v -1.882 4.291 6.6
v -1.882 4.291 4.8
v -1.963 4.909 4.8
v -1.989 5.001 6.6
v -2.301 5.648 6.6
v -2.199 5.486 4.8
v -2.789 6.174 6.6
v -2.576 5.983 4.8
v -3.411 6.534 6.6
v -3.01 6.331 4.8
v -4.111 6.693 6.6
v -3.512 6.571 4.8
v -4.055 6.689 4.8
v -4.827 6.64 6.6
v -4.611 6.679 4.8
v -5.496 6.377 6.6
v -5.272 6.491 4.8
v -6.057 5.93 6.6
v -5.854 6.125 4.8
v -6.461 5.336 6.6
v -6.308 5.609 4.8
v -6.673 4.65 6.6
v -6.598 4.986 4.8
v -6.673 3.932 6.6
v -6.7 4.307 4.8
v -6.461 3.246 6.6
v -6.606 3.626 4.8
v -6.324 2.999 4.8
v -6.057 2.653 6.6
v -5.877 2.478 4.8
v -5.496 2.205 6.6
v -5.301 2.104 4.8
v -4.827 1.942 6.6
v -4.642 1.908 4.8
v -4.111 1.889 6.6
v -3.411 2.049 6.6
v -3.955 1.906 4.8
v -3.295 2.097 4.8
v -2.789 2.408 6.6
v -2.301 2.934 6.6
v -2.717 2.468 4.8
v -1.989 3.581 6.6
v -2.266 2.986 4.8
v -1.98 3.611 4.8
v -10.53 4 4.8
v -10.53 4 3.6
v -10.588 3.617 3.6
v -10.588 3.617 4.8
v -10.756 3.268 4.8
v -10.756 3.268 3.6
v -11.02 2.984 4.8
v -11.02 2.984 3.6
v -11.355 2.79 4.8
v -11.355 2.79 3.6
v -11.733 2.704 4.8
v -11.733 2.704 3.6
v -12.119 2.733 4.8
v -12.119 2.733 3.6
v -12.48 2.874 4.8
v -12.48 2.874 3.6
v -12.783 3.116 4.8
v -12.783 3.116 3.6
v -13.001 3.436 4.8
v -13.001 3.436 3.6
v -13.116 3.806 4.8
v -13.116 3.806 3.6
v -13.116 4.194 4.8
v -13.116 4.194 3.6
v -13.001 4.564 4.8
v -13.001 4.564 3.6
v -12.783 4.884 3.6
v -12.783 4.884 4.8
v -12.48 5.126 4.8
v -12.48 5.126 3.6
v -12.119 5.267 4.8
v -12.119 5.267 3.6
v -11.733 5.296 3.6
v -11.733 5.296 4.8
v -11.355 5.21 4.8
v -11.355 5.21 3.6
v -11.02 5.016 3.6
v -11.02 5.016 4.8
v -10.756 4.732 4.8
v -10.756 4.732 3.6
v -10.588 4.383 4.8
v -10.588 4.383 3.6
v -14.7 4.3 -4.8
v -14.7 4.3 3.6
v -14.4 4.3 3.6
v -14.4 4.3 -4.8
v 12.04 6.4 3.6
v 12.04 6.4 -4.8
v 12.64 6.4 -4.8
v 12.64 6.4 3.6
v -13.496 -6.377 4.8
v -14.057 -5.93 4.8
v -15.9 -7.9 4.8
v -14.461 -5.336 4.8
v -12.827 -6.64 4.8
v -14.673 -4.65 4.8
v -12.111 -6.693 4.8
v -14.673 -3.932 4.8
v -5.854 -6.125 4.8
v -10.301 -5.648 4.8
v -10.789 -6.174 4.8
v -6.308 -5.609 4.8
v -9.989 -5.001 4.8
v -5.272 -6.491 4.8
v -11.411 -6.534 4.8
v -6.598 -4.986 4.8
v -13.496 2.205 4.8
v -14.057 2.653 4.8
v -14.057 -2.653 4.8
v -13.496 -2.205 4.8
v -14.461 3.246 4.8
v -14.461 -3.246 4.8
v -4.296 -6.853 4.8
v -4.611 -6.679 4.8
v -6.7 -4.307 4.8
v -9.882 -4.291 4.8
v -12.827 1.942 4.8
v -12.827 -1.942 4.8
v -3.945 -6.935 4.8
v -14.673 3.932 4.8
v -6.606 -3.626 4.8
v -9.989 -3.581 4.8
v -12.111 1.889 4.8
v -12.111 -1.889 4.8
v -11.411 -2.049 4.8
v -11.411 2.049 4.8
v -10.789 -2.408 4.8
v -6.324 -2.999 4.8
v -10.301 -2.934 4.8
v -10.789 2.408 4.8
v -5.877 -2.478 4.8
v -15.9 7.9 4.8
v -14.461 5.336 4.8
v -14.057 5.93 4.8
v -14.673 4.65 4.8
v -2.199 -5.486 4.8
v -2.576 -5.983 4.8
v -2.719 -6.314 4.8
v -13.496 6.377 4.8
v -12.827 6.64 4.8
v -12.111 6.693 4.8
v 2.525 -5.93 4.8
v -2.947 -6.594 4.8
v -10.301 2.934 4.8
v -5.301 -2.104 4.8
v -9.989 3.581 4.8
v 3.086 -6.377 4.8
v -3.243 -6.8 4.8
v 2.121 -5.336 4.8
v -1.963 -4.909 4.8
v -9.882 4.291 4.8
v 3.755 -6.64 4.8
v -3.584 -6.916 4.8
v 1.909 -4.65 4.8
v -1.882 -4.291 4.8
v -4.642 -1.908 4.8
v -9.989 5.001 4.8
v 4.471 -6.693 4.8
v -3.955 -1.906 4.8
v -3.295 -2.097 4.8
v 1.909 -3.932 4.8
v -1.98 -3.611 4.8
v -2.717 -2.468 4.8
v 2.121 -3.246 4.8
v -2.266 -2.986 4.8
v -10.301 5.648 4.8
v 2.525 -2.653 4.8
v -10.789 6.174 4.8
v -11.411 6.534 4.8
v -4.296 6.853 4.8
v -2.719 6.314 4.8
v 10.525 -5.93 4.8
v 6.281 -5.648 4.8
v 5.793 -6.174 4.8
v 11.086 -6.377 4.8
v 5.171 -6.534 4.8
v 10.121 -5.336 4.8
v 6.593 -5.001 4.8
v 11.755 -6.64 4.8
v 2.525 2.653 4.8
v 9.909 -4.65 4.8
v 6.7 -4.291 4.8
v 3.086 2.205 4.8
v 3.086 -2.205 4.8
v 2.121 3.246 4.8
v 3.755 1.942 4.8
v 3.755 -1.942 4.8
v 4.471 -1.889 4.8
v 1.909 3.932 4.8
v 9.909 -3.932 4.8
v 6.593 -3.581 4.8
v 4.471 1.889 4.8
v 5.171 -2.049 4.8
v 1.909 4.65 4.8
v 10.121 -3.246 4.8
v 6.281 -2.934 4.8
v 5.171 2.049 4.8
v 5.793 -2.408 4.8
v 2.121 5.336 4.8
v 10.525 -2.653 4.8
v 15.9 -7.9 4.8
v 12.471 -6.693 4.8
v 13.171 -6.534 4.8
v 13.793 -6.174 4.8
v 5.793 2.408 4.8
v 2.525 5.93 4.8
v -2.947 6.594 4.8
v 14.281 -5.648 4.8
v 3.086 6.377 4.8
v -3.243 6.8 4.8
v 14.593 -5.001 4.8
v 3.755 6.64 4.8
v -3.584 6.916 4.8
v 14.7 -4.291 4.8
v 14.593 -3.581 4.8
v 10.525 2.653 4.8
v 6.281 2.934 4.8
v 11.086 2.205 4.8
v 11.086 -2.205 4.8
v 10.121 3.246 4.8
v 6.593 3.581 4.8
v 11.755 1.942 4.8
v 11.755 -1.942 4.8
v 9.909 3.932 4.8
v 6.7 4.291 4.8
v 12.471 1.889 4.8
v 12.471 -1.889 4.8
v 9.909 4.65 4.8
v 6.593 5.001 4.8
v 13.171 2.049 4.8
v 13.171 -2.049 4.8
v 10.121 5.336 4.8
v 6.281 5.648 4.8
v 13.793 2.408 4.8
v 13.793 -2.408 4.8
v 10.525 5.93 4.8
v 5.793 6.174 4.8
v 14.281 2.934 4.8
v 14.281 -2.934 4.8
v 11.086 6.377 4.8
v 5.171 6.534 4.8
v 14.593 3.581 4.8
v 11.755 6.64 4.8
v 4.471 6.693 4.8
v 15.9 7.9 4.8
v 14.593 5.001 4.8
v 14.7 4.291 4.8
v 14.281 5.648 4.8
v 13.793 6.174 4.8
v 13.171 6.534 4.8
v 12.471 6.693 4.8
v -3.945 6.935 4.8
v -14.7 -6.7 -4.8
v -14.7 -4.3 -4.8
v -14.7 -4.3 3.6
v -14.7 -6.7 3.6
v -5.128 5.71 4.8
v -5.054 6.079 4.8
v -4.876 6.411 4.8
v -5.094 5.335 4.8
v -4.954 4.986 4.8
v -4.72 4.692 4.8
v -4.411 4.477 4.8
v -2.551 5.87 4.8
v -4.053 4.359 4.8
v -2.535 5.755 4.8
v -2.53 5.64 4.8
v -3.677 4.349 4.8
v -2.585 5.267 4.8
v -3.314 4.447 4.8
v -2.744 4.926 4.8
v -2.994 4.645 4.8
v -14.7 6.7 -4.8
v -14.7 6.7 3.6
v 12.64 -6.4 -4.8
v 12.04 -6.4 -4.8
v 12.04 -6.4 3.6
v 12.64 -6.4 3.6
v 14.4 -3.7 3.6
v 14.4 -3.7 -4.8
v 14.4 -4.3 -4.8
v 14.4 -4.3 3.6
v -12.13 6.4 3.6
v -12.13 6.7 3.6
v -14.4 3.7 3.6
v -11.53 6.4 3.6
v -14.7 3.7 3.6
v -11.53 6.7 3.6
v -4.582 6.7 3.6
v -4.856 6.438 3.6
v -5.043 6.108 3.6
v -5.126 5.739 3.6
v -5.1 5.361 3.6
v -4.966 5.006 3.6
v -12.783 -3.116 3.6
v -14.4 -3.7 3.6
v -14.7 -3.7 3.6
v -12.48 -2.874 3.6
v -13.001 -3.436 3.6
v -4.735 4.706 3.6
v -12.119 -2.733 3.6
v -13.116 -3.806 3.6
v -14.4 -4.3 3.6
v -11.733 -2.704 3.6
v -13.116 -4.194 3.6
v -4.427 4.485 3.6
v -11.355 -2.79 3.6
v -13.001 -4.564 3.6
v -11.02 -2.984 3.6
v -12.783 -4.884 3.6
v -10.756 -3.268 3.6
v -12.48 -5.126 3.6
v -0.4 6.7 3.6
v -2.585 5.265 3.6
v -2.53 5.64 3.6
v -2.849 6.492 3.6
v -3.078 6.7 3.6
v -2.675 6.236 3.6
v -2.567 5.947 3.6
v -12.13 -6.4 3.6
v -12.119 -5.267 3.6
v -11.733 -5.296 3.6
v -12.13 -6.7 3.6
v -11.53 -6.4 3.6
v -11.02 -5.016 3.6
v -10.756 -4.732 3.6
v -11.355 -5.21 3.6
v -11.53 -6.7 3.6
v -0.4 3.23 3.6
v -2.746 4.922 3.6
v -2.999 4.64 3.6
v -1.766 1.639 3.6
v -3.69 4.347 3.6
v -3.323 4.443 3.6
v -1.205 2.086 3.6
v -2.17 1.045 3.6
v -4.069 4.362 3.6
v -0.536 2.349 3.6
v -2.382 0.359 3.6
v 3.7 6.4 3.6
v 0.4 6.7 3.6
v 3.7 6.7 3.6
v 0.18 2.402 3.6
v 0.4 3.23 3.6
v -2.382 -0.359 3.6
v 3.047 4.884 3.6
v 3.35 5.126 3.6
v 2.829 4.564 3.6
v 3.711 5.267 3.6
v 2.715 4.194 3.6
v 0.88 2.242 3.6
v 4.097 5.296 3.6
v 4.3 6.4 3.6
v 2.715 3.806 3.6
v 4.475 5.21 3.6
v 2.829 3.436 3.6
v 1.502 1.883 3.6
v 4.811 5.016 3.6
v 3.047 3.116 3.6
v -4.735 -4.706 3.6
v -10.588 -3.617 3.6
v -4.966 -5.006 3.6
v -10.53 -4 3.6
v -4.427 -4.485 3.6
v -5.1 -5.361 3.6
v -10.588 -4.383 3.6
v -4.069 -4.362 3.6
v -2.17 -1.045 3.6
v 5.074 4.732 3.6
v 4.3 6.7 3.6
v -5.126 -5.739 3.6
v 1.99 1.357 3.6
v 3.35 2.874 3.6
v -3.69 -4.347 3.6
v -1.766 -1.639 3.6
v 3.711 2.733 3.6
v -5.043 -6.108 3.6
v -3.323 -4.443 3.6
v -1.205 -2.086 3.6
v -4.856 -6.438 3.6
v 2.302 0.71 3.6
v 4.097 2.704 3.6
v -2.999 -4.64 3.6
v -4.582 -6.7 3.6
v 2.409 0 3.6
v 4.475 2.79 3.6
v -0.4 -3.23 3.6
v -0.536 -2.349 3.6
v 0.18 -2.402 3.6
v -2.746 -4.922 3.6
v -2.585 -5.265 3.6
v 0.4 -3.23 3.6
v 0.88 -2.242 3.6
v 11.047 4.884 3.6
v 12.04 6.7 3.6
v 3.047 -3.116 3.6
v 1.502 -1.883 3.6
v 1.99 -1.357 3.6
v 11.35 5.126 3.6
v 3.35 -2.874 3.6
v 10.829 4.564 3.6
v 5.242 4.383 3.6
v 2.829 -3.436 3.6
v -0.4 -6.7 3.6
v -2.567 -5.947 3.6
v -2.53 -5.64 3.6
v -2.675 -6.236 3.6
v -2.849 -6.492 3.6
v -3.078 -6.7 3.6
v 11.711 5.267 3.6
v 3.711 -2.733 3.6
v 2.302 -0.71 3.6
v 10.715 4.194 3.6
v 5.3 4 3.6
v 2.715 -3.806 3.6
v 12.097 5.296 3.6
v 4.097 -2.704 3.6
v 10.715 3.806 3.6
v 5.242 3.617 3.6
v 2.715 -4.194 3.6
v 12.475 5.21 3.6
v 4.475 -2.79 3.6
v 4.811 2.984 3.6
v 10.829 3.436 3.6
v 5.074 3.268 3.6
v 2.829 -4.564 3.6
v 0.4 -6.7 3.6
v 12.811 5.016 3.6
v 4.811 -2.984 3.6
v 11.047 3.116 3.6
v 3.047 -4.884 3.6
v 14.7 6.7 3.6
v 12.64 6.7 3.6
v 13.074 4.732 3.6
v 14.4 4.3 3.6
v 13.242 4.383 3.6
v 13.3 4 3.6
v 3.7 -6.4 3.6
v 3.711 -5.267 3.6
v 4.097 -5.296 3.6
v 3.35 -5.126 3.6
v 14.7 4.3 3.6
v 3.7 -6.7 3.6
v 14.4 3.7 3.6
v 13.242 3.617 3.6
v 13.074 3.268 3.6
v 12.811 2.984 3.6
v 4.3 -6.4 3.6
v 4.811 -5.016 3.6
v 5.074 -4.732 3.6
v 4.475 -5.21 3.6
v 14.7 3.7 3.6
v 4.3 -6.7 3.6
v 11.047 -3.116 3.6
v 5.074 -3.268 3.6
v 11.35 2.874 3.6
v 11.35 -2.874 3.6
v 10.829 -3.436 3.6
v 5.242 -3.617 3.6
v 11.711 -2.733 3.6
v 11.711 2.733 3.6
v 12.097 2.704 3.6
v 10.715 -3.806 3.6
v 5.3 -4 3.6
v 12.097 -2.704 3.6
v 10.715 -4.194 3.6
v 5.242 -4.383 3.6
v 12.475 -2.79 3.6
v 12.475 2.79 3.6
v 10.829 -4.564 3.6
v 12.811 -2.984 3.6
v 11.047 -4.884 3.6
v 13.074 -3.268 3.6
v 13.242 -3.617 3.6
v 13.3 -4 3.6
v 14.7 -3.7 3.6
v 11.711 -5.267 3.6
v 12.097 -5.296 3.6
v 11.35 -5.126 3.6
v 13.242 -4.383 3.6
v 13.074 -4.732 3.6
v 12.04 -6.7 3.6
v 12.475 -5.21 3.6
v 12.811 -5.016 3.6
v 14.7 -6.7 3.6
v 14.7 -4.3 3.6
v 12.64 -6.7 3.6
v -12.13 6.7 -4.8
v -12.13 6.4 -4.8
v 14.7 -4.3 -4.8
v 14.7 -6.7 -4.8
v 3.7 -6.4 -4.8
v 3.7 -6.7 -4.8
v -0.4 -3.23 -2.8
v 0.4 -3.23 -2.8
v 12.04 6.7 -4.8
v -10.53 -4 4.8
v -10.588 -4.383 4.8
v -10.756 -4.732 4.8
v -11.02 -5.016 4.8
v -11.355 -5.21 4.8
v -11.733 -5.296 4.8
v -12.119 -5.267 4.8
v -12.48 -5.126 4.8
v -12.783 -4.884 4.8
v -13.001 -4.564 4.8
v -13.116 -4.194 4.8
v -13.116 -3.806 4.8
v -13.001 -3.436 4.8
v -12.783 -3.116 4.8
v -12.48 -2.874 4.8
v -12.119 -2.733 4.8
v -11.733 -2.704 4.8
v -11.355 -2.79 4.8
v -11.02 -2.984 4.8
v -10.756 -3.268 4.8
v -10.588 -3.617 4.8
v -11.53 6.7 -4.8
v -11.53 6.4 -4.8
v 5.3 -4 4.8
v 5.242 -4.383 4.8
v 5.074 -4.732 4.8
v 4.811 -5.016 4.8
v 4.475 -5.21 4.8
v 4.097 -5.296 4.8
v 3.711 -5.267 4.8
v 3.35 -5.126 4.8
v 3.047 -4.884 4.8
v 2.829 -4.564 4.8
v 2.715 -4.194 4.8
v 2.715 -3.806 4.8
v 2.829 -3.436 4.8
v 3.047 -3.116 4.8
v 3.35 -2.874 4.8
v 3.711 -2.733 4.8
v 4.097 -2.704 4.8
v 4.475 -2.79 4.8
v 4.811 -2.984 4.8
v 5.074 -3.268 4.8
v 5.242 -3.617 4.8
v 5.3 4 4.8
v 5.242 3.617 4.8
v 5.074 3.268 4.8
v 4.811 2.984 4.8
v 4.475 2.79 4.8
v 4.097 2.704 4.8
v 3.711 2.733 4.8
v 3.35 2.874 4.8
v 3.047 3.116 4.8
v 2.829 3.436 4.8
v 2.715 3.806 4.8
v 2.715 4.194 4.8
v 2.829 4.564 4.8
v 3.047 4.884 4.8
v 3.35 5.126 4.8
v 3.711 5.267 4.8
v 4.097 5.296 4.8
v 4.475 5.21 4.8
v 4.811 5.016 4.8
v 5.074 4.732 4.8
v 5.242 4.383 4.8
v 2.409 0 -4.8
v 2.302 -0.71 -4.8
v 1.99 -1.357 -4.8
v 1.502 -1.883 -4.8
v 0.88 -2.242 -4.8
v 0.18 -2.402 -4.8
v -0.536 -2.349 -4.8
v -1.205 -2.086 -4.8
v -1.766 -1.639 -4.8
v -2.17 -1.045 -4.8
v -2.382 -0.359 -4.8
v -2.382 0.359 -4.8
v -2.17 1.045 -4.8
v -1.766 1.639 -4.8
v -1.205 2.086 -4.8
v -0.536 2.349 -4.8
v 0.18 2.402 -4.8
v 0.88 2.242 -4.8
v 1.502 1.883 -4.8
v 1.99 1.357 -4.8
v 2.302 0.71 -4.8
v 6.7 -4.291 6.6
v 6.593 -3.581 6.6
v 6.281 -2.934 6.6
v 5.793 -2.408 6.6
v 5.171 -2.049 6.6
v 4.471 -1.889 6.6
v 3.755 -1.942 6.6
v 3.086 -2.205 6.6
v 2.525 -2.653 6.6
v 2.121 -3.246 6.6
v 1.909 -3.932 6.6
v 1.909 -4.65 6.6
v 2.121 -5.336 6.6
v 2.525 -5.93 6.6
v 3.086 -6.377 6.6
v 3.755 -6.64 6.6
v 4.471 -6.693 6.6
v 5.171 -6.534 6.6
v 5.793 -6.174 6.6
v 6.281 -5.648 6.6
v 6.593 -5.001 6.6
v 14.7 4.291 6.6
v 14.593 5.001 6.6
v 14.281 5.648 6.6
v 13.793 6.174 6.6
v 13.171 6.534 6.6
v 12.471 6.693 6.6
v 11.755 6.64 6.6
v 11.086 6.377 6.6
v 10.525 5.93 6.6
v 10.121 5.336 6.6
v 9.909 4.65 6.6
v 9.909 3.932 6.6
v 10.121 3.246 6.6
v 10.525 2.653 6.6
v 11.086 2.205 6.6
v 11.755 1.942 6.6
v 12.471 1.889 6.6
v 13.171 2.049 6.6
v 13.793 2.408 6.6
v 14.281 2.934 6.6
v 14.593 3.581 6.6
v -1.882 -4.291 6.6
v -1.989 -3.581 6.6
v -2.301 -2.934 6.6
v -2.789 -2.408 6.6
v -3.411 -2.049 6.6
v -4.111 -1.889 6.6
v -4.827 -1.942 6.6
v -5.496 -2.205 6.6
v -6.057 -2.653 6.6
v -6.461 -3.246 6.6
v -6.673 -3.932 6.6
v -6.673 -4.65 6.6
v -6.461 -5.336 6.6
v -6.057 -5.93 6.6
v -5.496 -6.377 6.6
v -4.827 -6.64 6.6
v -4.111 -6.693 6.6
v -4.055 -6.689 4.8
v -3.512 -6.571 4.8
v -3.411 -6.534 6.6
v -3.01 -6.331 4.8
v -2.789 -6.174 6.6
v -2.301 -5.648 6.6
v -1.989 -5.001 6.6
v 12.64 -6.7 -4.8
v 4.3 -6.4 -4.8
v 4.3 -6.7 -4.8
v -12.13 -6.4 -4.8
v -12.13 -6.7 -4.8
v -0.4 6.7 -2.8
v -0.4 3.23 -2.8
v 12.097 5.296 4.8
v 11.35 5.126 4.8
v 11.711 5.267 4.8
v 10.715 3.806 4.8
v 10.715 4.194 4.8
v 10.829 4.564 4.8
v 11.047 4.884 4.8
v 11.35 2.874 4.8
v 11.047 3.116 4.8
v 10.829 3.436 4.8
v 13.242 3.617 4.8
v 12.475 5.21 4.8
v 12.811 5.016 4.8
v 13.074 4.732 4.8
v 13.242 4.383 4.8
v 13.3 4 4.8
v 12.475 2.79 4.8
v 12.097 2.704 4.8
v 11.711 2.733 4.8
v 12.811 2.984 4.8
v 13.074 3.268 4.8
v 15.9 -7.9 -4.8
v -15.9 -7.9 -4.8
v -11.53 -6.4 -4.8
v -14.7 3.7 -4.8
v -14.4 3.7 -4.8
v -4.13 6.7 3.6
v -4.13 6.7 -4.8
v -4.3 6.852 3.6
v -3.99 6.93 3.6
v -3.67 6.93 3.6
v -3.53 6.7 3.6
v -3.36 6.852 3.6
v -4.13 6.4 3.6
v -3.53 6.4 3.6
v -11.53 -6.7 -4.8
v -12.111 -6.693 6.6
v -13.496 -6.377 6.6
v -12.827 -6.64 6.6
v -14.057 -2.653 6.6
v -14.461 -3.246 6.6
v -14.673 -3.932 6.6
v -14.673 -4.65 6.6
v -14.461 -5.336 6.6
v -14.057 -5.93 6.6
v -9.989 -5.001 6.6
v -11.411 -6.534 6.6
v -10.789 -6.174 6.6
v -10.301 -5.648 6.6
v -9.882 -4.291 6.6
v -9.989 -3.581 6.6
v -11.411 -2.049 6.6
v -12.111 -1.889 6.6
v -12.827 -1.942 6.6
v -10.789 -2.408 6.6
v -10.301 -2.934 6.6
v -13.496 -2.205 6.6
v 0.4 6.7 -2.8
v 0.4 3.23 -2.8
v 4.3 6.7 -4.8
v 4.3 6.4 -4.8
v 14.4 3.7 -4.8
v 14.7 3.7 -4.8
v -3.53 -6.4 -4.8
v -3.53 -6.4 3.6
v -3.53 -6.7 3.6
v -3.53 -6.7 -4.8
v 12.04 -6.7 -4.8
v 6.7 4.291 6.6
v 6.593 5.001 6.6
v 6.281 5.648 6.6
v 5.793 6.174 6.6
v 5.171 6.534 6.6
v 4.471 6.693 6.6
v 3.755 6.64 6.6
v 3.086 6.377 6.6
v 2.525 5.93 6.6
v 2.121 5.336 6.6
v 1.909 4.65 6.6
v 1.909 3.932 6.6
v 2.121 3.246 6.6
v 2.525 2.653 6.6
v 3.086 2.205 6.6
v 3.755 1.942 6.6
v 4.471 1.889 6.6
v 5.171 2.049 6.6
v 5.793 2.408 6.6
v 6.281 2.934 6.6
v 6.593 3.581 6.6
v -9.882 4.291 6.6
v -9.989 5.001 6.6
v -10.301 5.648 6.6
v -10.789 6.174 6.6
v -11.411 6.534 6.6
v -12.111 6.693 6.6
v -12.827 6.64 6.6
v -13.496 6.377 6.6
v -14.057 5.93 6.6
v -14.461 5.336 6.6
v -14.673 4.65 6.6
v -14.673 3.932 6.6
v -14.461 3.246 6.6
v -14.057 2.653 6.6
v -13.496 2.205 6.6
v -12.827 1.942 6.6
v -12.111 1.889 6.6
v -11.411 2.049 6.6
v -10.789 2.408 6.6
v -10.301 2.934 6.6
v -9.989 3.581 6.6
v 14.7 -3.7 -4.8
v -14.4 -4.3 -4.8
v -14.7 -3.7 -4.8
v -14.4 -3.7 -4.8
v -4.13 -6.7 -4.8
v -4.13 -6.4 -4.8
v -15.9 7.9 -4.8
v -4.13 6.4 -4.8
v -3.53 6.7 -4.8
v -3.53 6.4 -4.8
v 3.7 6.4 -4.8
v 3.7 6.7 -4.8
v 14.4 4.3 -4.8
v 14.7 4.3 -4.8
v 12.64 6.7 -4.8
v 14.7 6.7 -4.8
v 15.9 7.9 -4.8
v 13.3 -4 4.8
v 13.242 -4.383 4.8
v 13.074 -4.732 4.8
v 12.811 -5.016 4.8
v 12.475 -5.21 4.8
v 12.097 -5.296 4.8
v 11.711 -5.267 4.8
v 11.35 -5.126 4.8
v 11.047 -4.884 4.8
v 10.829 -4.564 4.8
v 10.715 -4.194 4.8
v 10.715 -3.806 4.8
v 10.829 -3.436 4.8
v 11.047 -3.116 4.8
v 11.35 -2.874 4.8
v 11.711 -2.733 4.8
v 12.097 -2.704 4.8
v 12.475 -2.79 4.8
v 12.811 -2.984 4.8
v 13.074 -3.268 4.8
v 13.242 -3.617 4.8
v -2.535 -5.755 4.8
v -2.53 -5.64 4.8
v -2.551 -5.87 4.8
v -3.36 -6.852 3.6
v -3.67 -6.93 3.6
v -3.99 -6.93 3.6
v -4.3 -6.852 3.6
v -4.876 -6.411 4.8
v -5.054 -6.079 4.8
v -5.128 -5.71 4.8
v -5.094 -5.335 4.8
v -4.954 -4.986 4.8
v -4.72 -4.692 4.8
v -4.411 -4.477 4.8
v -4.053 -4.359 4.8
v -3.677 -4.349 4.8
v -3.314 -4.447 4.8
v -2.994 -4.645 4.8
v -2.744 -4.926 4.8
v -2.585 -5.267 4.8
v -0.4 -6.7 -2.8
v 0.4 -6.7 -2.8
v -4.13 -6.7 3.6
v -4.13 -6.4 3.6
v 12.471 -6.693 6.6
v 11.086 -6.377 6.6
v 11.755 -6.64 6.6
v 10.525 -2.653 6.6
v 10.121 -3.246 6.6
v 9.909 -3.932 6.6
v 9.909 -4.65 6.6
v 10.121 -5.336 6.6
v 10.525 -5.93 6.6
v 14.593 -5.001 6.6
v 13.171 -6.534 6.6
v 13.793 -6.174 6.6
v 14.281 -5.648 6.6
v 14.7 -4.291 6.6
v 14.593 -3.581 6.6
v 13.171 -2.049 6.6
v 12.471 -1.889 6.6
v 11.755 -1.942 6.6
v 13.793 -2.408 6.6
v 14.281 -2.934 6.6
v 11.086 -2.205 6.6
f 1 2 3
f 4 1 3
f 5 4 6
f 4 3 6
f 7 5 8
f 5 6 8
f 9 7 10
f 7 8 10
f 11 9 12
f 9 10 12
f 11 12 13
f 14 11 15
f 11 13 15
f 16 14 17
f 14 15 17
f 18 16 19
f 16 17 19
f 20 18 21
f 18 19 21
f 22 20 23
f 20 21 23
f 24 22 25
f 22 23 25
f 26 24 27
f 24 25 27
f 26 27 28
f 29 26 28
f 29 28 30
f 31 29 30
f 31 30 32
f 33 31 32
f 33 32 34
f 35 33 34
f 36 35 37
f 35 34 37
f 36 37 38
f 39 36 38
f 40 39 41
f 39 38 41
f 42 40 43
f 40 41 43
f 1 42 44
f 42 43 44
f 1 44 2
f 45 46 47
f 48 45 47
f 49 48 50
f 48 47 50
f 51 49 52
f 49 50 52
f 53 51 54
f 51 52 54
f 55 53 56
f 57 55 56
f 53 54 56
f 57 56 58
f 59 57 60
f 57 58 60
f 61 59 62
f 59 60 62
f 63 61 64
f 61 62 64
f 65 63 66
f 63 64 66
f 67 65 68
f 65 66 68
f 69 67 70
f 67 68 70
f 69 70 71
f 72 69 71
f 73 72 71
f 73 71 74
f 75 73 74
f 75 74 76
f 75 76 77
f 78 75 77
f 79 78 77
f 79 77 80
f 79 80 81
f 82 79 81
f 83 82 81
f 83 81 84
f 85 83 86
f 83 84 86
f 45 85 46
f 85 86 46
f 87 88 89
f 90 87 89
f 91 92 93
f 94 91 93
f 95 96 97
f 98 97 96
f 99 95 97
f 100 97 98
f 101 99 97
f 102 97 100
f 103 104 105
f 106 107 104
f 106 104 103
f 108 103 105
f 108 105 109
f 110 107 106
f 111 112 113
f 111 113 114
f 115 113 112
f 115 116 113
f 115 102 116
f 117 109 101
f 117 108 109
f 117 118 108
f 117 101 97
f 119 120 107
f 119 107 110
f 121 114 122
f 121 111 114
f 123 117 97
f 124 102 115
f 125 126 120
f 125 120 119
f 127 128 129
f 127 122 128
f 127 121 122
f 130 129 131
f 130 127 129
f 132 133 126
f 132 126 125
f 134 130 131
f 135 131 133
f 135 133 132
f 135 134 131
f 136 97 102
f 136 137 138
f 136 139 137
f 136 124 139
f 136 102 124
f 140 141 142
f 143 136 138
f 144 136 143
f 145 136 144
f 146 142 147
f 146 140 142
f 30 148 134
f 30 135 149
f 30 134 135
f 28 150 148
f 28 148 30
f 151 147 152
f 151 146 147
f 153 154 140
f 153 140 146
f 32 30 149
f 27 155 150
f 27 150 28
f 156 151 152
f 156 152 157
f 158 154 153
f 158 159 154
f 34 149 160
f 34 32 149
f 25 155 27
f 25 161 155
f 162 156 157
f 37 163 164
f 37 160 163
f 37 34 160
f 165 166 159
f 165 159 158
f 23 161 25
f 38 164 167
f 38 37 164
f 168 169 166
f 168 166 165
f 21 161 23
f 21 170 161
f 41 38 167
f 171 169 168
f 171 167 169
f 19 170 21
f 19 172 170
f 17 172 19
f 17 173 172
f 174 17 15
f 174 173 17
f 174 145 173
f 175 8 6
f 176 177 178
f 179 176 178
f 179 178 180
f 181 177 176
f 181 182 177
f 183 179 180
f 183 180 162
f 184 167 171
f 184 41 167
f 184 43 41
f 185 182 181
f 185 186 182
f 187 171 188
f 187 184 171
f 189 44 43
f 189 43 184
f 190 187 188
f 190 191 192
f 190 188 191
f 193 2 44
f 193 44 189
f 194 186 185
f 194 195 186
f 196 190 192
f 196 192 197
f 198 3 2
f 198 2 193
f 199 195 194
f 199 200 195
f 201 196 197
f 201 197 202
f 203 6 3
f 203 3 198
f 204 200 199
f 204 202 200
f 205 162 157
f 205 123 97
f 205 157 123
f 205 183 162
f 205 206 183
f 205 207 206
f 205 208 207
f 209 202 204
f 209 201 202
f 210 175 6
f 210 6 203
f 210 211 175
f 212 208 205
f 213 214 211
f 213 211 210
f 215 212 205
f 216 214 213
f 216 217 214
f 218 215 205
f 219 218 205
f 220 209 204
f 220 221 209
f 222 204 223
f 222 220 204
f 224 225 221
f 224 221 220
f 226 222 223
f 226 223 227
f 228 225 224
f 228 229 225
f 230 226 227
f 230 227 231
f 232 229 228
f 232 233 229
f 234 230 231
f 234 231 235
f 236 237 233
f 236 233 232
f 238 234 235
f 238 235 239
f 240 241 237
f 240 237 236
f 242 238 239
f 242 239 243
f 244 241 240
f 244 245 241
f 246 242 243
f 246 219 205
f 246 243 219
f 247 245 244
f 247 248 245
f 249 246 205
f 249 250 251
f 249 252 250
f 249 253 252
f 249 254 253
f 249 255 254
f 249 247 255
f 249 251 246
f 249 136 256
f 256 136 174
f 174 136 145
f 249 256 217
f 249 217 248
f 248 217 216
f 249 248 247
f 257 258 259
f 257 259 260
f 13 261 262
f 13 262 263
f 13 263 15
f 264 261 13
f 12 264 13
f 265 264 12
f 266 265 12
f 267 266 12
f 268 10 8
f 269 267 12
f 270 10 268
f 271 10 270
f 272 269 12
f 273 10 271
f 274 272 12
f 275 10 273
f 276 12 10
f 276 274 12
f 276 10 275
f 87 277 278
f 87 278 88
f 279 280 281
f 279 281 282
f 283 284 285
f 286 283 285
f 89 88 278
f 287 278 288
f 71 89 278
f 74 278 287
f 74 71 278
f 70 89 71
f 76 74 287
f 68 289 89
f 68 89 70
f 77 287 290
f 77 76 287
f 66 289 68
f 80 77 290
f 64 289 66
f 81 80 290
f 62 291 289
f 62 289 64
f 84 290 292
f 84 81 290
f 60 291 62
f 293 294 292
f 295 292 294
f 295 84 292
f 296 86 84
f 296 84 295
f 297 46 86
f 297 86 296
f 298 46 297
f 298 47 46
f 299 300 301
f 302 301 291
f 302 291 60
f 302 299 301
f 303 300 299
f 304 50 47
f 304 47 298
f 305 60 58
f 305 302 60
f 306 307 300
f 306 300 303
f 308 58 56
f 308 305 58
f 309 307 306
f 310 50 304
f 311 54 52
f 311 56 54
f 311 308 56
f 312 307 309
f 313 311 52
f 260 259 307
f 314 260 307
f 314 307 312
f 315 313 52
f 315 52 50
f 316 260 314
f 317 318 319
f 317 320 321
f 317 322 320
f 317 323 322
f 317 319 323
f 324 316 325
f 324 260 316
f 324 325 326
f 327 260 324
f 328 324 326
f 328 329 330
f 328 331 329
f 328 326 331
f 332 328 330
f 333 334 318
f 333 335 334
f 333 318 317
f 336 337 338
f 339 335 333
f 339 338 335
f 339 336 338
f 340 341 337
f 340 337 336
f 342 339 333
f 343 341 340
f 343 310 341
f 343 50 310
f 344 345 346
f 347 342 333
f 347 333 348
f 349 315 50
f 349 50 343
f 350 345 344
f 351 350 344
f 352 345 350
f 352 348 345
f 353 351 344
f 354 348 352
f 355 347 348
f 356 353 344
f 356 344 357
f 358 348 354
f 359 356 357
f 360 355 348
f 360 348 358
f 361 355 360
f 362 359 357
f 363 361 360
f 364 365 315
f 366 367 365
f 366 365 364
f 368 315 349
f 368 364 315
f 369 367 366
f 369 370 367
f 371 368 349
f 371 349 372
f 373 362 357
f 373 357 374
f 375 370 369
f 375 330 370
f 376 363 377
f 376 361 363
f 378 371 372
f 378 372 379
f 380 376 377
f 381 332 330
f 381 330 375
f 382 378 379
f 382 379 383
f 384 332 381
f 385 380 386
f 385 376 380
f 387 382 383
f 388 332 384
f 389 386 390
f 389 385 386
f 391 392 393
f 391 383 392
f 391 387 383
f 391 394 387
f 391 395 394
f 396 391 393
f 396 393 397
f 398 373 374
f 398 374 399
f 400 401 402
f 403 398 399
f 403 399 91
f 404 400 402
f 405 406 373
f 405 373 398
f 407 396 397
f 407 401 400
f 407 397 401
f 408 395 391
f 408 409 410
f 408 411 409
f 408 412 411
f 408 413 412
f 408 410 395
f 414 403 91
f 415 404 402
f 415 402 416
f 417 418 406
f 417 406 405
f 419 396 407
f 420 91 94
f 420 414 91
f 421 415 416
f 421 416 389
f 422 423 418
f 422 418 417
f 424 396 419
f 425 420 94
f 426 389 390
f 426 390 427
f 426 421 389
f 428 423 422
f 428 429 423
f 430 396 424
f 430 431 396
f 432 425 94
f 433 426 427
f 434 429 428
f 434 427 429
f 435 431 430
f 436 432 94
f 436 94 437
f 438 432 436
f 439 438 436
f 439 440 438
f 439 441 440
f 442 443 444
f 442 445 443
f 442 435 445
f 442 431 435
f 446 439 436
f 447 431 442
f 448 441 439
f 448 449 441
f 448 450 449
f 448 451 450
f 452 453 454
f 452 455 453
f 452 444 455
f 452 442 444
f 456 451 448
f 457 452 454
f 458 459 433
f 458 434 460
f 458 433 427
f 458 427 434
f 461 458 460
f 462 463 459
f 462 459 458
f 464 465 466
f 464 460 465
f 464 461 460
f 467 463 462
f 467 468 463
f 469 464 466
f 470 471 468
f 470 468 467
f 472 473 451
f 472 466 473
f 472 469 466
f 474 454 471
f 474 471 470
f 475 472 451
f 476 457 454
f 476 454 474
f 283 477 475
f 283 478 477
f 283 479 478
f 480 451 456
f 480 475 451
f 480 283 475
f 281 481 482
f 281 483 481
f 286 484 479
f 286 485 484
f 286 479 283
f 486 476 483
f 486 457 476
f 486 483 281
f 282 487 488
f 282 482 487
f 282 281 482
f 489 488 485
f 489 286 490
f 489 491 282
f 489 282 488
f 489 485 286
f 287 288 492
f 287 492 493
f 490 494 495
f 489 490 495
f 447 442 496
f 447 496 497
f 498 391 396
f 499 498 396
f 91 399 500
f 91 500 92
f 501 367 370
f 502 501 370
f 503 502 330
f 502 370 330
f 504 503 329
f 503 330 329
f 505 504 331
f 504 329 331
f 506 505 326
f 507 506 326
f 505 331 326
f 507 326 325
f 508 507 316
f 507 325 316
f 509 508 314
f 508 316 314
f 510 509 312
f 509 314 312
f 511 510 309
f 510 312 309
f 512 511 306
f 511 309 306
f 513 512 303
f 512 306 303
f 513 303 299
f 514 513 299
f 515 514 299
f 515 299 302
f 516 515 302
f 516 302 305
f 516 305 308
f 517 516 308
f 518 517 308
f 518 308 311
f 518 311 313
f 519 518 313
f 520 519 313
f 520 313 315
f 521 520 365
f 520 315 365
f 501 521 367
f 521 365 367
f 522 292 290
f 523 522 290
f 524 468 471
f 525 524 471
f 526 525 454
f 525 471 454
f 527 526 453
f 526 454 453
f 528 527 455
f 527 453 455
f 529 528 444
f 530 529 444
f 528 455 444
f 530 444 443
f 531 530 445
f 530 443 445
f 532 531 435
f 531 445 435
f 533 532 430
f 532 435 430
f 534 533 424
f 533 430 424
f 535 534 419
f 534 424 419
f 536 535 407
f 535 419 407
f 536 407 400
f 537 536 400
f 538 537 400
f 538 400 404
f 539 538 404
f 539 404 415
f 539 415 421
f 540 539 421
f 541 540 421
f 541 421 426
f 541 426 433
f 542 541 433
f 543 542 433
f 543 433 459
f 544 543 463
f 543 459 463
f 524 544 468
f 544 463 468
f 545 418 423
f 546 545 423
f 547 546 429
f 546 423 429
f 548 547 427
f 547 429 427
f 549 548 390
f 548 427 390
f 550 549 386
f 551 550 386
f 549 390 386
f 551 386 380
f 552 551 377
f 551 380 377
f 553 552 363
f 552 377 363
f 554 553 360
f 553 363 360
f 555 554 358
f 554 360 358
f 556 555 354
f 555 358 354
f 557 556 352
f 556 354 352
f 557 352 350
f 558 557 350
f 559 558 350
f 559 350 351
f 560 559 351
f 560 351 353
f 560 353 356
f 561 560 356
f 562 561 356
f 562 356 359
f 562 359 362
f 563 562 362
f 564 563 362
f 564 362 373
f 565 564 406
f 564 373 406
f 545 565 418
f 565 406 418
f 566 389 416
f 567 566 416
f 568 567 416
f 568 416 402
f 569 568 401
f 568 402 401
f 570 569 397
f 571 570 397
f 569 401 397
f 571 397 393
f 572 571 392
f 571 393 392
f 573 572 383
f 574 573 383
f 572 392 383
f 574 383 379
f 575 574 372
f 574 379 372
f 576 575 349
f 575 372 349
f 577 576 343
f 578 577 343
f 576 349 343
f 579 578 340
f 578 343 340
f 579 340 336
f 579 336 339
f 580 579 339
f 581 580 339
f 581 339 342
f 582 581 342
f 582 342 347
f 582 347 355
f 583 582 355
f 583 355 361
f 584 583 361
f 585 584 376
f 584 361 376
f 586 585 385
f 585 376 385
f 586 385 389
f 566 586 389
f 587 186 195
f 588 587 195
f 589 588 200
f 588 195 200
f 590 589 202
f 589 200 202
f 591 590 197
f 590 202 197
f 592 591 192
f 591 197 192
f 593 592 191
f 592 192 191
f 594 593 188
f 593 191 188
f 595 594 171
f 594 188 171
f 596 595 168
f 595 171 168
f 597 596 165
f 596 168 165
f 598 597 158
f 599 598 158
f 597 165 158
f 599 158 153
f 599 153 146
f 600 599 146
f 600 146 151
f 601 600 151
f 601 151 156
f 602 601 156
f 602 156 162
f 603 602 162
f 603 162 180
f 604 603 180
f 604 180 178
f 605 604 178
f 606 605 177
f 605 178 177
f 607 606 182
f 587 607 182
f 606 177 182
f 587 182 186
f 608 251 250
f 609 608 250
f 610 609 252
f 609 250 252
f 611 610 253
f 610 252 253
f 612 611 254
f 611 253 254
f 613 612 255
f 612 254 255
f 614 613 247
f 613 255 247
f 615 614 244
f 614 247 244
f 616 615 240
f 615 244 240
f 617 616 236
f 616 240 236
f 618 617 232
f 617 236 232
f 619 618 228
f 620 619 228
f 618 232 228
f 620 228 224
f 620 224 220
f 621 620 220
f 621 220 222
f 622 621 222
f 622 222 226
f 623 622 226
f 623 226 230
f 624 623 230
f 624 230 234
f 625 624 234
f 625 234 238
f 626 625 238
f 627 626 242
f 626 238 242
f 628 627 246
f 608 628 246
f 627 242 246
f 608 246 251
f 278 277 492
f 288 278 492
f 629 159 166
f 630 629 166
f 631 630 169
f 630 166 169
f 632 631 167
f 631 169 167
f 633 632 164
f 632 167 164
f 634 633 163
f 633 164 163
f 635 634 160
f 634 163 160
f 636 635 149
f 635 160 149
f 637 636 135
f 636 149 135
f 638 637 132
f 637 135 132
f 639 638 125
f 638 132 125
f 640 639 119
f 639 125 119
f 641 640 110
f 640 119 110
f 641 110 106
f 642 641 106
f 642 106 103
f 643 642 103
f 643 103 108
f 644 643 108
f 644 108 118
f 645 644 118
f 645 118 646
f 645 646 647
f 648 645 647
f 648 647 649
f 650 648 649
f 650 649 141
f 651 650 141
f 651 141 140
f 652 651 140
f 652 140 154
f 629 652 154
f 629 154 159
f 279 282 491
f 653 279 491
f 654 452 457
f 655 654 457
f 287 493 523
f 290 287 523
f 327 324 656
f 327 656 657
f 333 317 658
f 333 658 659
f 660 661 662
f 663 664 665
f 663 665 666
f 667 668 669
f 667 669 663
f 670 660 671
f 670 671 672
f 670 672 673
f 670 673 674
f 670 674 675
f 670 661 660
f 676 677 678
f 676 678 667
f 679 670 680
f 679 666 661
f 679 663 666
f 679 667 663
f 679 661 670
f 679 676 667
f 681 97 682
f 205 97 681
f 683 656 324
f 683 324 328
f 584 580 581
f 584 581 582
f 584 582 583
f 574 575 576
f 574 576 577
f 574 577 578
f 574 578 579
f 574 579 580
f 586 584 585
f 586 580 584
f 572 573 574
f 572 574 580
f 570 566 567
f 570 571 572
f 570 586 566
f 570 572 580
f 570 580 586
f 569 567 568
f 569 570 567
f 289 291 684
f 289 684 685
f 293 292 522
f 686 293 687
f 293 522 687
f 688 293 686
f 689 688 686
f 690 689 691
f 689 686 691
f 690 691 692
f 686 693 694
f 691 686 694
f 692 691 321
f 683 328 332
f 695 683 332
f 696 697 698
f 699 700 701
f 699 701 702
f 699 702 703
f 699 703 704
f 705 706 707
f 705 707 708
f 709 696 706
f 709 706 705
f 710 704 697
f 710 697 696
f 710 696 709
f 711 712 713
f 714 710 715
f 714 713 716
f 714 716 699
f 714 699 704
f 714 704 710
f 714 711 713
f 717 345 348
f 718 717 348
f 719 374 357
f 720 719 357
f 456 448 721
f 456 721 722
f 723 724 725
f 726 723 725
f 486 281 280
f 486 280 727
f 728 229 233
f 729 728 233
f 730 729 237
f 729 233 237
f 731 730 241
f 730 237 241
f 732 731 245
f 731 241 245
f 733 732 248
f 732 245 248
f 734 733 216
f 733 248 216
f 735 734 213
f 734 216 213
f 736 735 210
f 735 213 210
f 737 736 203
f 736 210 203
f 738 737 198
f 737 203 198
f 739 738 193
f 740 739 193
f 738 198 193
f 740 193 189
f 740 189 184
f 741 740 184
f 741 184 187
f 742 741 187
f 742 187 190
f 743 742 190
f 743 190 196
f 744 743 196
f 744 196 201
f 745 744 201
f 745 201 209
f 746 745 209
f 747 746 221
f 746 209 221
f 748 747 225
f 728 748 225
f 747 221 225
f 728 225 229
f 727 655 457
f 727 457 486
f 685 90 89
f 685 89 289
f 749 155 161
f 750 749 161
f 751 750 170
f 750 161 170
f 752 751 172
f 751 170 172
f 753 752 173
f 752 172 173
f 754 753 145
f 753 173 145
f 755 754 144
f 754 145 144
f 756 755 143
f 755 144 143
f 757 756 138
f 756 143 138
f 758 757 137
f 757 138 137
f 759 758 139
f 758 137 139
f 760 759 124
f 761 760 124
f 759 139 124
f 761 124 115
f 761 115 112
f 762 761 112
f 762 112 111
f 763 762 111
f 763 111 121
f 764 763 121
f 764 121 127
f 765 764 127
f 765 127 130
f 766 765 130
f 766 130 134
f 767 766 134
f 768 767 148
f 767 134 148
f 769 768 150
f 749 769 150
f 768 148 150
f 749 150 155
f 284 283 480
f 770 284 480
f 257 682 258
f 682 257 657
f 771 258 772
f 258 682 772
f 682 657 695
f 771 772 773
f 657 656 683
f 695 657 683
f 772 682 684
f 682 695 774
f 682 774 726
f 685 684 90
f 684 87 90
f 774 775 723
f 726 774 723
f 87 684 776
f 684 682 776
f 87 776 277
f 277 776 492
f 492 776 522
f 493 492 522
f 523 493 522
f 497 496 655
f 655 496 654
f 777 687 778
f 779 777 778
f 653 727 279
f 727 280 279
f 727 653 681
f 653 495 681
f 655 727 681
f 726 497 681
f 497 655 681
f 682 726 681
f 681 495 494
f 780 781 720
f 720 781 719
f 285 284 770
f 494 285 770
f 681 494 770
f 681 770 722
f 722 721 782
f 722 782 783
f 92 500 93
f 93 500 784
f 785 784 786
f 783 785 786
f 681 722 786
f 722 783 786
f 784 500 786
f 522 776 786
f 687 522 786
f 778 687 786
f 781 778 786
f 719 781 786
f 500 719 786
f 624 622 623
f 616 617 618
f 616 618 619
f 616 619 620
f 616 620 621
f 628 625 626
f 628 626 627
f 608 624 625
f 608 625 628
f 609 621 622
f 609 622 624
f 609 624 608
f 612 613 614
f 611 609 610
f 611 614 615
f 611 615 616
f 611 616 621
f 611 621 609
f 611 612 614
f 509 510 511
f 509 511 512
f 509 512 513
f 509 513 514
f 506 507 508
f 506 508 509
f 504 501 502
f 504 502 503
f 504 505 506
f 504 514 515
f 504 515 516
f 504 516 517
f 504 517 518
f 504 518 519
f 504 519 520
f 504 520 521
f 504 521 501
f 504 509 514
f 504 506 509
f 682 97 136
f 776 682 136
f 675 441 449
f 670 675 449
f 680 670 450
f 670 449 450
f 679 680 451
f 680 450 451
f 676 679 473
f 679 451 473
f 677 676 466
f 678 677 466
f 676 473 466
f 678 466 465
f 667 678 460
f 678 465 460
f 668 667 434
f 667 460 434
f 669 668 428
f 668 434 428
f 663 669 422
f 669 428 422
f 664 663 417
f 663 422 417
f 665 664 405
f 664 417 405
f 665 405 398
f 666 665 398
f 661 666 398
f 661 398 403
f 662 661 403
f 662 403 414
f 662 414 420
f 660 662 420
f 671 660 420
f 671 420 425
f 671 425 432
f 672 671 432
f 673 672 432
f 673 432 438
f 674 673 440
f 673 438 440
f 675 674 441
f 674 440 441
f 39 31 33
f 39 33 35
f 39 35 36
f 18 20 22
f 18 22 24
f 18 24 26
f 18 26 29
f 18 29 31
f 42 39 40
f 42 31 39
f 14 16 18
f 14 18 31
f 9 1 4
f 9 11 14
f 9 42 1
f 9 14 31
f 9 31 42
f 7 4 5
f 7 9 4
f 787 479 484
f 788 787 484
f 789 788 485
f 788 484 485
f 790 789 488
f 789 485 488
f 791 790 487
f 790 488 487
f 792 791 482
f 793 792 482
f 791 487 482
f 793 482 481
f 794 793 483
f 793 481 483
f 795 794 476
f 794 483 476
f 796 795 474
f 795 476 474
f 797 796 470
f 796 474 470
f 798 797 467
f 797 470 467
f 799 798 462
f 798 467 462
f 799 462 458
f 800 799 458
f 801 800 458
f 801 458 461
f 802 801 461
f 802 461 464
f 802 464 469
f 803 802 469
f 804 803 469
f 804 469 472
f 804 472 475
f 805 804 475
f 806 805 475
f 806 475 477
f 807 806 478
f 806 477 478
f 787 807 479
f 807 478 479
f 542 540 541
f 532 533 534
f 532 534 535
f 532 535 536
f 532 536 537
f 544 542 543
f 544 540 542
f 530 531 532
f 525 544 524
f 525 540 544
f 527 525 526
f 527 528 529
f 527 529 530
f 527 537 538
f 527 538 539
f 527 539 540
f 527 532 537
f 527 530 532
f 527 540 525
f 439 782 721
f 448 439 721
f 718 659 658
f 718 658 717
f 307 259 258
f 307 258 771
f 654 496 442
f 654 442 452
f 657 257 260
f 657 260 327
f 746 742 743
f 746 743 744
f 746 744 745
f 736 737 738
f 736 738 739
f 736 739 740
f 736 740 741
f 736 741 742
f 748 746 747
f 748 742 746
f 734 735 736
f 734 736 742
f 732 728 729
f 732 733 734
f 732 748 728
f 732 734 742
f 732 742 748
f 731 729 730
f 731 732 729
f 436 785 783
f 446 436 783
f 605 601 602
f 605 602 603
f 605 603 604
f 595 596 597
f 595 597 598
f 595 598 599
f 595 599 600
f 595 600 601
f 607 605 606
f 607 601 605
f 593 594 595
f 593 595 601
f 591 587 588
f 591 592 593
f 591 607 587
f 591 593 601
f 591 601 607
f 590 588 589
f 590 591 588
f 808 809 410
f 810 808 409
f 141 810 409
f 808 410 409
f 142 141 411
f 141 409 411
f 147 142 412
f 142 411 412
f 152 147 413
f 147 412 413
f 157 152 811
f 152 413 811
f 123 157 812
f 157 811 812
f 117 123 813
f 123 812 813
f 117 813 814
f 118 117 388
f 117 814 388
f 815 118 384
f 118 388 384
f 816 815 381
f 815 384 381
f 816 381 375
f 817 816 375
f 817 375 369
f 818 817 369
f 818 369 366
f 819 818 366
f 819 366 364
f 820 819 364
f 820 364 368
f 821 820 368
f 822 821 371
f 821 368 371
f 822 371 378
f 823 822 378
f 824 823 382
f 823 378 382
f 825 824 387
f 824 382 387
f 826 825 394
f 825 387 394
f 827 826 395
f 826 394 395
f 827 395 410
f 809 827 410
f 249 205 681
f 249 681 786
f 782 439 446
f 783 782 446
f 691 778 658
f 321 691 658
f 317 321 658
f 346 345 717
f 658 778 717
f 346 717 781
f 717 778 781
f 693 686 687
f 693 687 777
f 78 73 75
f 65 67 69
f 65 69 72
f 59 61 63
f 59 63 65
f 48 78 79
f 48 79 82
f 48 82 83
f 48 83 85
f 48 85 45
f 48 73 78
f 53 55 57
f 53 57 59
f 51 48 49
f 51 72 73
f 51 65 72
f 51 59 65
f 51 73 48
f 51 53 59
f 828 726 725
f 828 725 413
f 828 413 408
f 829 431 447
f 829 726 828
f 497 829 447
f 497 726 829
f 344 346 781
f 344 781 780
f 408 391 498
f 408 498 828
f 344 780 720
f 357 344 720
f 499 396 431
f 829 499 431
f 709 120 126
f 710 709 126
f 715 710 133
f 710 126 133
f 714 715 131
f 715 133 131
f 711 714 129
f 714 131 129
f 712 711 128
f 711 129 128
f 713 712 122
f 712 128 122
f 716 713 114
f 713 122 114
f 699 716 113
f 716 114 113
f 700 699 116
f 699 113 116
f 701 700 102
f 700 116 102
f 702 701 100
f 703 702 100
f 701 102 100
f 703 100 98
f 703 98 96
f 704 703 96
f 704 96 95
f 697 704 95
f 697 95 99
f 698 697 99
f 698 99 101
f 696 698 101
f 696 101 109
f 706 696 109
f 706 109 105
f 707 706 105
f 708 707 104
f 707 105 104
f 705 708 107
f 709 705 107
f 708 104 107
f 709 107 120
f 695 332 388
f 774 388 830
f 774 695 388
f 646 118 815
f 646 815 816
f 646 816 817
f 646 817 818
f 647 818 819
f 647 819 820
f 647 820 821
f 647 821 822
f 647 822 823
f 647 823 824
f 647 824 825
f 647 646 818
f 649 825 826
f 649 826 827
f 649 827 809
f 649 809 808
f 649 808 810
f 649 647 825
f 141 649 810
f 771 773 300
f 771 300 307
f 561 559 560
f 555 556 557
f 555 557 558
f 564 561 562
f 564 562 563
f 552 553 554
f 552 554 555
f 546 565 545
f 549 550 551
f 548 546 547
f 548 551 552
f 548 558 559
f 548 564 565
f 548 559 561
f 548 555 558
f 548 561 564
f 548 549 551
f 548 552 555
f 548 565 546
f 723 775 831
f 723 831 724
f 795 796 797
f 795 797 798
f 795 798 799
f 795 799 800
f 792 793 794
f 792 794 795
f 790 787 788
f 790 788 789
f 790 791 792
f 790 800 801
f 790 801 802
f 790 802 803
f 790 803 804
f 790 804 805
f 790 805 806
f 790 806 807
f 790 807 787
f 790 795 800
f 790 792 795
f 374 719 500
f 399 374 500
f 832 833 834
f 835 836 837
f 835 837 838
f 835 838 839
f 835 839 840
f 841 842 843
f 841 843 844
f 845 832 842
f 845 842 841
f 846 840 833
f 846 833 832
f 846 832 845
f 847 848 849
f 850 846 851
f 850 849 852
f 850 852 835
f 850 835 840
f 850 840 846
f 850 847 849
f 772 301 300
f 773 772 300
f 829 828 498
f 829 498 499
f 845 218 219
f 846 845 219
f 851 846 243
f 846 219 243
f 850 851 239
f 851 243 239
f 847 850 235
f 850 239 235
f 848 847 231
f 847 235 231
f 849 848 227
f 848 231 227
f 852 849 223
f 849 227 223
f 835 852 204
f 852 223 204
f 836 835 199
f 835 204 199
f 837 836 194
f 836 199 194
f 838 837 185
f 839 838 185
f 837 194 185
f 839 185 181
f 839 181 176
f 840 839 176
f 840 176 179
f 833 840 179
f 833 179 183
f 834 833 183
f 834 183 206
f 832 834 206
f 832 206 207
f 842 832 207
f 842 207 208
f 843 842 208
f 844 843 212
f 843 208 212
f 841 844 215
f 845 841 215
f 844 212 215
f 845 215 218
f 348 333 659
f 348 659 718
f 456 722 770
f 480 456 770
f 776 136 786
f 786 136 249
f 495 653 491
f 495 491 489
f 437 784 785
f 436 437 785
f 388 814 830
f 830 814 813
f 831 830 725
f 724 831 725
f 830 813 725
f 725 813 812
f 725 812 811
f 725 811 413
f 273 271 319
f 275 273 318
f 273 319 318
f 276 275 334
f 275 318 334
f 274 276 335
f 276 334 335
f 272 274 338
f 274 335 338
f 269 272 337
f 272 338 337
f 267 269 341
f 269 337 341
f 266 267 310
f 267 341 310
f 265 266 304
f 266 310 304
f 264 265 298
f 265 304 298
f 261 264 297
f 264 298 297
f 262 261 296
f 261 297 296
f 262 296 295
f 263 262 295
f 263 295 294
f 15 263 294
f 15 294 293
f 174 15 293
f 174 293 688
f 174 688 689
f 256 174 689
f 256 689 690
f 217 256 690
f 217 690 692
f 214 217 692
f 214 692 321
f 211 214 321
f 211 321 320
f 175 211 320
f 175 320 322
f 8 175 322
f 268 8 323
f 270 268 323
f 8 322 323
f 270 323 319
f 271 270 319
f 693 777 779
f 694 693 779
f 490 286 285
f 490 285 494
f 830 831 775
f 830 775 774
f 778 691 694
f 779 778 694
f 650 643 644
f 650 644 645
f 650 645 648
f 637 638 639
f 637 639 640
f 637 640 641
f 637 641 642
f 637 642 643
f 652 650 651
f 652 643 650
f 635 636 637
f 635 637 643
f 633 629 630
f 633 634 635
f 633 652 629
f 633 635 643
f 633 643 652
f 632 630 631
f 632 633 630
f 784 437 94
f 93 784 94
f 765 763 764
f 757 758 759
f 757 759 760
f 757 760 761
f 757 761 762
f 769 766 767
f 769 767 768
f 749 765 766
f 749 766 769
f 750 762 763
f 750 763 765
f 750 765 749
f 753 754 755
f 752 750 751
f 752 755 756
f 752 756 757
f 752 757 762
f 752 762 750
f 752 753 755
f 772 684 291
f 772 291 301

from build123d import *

# Parameters (mm, degrees)
F0_W      = 31.8
F0_H      = 15.8
F1_DEPTH  = 4.8
F2_W      = 29.4
F2_H      = 13.4
F3_DEPTH  = 8.4
F4_R      = 2.409
F5_DEPTH  = 1.8
F6_R      = 1.3
F7_DEPTH  = 1.2
F8_R      = 2.409
F9_DEPTH  = 8.4
F10_W     = 0.3
F10_H     = 0.6
F11_DEPTH = 8.4
F12_W     = 0.6
F12_H     = 0.3
F13_DEPTH = 8.4
F14_W     = 0.8
F14_H     = 3.4696710694
F15_DEPTH = 6.4


with BuildPart() as f1:
    # F0 (on Top) → F1 (new body, symmetric)
    with BuildSketch(Plane.XY):
        Rectangle(F0_W, F0_H)
    extrude(amount=F1_DEPTH, both=True)

    # F2 (on face) → F3 (cut)
    with BuildSketch(Plane(origin=(0, 0, -4.8), x_dir=(1, 0, 0), z_dir=(0, 0, -1))):
        Rectangle(F2_W, F2_H)
    extrude(amount=-F3_DEPTH, mode=Mode.SUBTRACT)

    # F4 (on face) → F5 (join)
    with BuildSketch(Plane.XY.offset(4.8)):
        with Locations((-12.291, 4.2910612803)):
            Circle(F4_R)
        with Locations((12.291, 4.2910612803)):
            Circle(F4_R)
        with Locations((-12.291, -4.2910612803)):
            Circle(F4_R)
        with Locations((12.291, -4.2910612803)):
            Circle(F4_R)
        with Locations((-4.291, 4.2910612803)):
            Circle(F4_R)
        with Locations((4.291, 4.2910612803)):
            Circle(F4_R)
        with Locations((-4.291, -4.2910612803)):
            Circle(F4_R)
        with Locations((4.291, -4.2910612803)):
            Circle(F4_R)
    extrude(amount=F5_DEPTH)

    # F6 (on face) → F7 (cut)
    with BuildSketch(Plane(origin=(0, 0, 3.6), x_dir=(1, 0, 0), z_dir=(0, 0, -1))):
        with Locations((-11.8301756735, 4)):
            Circle(F6_R)
        with Locations((-3.8301756735, 5.6396185296)):
            Circle(F6_R)
        with Locations((4, 4)):
            Circle(F6_R)
        with Locations((12, 4)):
            Circle(F6_R)
        with Locations((-11.8301756735, -4)):
            Circle(F6_R)
        with Locations((-3.8301756735, -5.6396185296)):
            Circle(F6_R)
        with Locations((4, -4)):
            Circle(F6_R)
        with Locations((12, -4)):
            Circle(F6_R)
    extrude(amount=-F7_DEPTH, mode=Mode.SUBTRACT)

    # F8 (on face) → F9 (join, through all)
    with BuildSketch(Plane(origin=(0, 0, 3.6), x_dir=(1, 0, 0), z_dir=(0, 0, -1))):
        Circle(F8_R)
    extrude(amount=F9_DEPTH)

    # F10 (on face) → F11 (join, through all)
    with BuildSketch(Plane(origin=(0, 0, 3.6), x_dir=(1, 0, 0), z_dir=(0, 0, -1))):
        with Locations((-14.55, 4)):
            Rectangle(F10_W, F10_H)
        with Locations((-14.55, -4)):
            Rectangle(F10_W, F10_H)
        with Locations((14.55, 4)):
            Rectangle(F10_W, F10_H)
        with Locations((14.55, -4)):
            Rectangle(F10_W, F10_H)
    extrude(amount=F11_DEPTH)

    # F12 (on face) → F13 (join, through all)
    with BuildSketch(Plane(origin=(0, 0, 3.6), x_dir=(1, 0, 0), z_dir=(0, 0, -1))):
        with Locations((-11.8301756735, 6.55)):
            Rectangle(F12_W, F12_H)
        with Locations((-3.8301756735, 6.55)):
            Rectangle(F12_W, F12_H)
        with Locations((4, 6.55)):
            Rectangle(F12_W, F12_H)
        with Locations((12.3396486531, 6.55)):
            Rectangle(F12_W, F12_H)
        with Locations((-3.8301756735, -6.55)):
            Rectangle(F12_W, F12_H)
        with Locations((-11.8301756735, -6.55)):
            Rectangle(F12_W, F12_H)
        with Locations((4, -6.55)):
            Rectangle(F12_W, F12_H)
        with Locations((12.3396486531, -6.55)):
            Rectangle(F12_W, F12_H)
    extrude(amount=F13_DEPTH)

    # F14 (on face) → F15 (join)
    with BuildSketch(Plane(origin=(0, 0, 3.6), x_dir=(1, 0, 0), z_dir=(0, 0, -1))):
        with Locations((0, 4.9651644653)):
            Rectangle(F14_W, F14_H)
        with Locations((0, -4.9651644653)):
            Rectangle(F14_W, F14_H)
    extrude(amount=F15_DEPTH)


solid = f1.part
